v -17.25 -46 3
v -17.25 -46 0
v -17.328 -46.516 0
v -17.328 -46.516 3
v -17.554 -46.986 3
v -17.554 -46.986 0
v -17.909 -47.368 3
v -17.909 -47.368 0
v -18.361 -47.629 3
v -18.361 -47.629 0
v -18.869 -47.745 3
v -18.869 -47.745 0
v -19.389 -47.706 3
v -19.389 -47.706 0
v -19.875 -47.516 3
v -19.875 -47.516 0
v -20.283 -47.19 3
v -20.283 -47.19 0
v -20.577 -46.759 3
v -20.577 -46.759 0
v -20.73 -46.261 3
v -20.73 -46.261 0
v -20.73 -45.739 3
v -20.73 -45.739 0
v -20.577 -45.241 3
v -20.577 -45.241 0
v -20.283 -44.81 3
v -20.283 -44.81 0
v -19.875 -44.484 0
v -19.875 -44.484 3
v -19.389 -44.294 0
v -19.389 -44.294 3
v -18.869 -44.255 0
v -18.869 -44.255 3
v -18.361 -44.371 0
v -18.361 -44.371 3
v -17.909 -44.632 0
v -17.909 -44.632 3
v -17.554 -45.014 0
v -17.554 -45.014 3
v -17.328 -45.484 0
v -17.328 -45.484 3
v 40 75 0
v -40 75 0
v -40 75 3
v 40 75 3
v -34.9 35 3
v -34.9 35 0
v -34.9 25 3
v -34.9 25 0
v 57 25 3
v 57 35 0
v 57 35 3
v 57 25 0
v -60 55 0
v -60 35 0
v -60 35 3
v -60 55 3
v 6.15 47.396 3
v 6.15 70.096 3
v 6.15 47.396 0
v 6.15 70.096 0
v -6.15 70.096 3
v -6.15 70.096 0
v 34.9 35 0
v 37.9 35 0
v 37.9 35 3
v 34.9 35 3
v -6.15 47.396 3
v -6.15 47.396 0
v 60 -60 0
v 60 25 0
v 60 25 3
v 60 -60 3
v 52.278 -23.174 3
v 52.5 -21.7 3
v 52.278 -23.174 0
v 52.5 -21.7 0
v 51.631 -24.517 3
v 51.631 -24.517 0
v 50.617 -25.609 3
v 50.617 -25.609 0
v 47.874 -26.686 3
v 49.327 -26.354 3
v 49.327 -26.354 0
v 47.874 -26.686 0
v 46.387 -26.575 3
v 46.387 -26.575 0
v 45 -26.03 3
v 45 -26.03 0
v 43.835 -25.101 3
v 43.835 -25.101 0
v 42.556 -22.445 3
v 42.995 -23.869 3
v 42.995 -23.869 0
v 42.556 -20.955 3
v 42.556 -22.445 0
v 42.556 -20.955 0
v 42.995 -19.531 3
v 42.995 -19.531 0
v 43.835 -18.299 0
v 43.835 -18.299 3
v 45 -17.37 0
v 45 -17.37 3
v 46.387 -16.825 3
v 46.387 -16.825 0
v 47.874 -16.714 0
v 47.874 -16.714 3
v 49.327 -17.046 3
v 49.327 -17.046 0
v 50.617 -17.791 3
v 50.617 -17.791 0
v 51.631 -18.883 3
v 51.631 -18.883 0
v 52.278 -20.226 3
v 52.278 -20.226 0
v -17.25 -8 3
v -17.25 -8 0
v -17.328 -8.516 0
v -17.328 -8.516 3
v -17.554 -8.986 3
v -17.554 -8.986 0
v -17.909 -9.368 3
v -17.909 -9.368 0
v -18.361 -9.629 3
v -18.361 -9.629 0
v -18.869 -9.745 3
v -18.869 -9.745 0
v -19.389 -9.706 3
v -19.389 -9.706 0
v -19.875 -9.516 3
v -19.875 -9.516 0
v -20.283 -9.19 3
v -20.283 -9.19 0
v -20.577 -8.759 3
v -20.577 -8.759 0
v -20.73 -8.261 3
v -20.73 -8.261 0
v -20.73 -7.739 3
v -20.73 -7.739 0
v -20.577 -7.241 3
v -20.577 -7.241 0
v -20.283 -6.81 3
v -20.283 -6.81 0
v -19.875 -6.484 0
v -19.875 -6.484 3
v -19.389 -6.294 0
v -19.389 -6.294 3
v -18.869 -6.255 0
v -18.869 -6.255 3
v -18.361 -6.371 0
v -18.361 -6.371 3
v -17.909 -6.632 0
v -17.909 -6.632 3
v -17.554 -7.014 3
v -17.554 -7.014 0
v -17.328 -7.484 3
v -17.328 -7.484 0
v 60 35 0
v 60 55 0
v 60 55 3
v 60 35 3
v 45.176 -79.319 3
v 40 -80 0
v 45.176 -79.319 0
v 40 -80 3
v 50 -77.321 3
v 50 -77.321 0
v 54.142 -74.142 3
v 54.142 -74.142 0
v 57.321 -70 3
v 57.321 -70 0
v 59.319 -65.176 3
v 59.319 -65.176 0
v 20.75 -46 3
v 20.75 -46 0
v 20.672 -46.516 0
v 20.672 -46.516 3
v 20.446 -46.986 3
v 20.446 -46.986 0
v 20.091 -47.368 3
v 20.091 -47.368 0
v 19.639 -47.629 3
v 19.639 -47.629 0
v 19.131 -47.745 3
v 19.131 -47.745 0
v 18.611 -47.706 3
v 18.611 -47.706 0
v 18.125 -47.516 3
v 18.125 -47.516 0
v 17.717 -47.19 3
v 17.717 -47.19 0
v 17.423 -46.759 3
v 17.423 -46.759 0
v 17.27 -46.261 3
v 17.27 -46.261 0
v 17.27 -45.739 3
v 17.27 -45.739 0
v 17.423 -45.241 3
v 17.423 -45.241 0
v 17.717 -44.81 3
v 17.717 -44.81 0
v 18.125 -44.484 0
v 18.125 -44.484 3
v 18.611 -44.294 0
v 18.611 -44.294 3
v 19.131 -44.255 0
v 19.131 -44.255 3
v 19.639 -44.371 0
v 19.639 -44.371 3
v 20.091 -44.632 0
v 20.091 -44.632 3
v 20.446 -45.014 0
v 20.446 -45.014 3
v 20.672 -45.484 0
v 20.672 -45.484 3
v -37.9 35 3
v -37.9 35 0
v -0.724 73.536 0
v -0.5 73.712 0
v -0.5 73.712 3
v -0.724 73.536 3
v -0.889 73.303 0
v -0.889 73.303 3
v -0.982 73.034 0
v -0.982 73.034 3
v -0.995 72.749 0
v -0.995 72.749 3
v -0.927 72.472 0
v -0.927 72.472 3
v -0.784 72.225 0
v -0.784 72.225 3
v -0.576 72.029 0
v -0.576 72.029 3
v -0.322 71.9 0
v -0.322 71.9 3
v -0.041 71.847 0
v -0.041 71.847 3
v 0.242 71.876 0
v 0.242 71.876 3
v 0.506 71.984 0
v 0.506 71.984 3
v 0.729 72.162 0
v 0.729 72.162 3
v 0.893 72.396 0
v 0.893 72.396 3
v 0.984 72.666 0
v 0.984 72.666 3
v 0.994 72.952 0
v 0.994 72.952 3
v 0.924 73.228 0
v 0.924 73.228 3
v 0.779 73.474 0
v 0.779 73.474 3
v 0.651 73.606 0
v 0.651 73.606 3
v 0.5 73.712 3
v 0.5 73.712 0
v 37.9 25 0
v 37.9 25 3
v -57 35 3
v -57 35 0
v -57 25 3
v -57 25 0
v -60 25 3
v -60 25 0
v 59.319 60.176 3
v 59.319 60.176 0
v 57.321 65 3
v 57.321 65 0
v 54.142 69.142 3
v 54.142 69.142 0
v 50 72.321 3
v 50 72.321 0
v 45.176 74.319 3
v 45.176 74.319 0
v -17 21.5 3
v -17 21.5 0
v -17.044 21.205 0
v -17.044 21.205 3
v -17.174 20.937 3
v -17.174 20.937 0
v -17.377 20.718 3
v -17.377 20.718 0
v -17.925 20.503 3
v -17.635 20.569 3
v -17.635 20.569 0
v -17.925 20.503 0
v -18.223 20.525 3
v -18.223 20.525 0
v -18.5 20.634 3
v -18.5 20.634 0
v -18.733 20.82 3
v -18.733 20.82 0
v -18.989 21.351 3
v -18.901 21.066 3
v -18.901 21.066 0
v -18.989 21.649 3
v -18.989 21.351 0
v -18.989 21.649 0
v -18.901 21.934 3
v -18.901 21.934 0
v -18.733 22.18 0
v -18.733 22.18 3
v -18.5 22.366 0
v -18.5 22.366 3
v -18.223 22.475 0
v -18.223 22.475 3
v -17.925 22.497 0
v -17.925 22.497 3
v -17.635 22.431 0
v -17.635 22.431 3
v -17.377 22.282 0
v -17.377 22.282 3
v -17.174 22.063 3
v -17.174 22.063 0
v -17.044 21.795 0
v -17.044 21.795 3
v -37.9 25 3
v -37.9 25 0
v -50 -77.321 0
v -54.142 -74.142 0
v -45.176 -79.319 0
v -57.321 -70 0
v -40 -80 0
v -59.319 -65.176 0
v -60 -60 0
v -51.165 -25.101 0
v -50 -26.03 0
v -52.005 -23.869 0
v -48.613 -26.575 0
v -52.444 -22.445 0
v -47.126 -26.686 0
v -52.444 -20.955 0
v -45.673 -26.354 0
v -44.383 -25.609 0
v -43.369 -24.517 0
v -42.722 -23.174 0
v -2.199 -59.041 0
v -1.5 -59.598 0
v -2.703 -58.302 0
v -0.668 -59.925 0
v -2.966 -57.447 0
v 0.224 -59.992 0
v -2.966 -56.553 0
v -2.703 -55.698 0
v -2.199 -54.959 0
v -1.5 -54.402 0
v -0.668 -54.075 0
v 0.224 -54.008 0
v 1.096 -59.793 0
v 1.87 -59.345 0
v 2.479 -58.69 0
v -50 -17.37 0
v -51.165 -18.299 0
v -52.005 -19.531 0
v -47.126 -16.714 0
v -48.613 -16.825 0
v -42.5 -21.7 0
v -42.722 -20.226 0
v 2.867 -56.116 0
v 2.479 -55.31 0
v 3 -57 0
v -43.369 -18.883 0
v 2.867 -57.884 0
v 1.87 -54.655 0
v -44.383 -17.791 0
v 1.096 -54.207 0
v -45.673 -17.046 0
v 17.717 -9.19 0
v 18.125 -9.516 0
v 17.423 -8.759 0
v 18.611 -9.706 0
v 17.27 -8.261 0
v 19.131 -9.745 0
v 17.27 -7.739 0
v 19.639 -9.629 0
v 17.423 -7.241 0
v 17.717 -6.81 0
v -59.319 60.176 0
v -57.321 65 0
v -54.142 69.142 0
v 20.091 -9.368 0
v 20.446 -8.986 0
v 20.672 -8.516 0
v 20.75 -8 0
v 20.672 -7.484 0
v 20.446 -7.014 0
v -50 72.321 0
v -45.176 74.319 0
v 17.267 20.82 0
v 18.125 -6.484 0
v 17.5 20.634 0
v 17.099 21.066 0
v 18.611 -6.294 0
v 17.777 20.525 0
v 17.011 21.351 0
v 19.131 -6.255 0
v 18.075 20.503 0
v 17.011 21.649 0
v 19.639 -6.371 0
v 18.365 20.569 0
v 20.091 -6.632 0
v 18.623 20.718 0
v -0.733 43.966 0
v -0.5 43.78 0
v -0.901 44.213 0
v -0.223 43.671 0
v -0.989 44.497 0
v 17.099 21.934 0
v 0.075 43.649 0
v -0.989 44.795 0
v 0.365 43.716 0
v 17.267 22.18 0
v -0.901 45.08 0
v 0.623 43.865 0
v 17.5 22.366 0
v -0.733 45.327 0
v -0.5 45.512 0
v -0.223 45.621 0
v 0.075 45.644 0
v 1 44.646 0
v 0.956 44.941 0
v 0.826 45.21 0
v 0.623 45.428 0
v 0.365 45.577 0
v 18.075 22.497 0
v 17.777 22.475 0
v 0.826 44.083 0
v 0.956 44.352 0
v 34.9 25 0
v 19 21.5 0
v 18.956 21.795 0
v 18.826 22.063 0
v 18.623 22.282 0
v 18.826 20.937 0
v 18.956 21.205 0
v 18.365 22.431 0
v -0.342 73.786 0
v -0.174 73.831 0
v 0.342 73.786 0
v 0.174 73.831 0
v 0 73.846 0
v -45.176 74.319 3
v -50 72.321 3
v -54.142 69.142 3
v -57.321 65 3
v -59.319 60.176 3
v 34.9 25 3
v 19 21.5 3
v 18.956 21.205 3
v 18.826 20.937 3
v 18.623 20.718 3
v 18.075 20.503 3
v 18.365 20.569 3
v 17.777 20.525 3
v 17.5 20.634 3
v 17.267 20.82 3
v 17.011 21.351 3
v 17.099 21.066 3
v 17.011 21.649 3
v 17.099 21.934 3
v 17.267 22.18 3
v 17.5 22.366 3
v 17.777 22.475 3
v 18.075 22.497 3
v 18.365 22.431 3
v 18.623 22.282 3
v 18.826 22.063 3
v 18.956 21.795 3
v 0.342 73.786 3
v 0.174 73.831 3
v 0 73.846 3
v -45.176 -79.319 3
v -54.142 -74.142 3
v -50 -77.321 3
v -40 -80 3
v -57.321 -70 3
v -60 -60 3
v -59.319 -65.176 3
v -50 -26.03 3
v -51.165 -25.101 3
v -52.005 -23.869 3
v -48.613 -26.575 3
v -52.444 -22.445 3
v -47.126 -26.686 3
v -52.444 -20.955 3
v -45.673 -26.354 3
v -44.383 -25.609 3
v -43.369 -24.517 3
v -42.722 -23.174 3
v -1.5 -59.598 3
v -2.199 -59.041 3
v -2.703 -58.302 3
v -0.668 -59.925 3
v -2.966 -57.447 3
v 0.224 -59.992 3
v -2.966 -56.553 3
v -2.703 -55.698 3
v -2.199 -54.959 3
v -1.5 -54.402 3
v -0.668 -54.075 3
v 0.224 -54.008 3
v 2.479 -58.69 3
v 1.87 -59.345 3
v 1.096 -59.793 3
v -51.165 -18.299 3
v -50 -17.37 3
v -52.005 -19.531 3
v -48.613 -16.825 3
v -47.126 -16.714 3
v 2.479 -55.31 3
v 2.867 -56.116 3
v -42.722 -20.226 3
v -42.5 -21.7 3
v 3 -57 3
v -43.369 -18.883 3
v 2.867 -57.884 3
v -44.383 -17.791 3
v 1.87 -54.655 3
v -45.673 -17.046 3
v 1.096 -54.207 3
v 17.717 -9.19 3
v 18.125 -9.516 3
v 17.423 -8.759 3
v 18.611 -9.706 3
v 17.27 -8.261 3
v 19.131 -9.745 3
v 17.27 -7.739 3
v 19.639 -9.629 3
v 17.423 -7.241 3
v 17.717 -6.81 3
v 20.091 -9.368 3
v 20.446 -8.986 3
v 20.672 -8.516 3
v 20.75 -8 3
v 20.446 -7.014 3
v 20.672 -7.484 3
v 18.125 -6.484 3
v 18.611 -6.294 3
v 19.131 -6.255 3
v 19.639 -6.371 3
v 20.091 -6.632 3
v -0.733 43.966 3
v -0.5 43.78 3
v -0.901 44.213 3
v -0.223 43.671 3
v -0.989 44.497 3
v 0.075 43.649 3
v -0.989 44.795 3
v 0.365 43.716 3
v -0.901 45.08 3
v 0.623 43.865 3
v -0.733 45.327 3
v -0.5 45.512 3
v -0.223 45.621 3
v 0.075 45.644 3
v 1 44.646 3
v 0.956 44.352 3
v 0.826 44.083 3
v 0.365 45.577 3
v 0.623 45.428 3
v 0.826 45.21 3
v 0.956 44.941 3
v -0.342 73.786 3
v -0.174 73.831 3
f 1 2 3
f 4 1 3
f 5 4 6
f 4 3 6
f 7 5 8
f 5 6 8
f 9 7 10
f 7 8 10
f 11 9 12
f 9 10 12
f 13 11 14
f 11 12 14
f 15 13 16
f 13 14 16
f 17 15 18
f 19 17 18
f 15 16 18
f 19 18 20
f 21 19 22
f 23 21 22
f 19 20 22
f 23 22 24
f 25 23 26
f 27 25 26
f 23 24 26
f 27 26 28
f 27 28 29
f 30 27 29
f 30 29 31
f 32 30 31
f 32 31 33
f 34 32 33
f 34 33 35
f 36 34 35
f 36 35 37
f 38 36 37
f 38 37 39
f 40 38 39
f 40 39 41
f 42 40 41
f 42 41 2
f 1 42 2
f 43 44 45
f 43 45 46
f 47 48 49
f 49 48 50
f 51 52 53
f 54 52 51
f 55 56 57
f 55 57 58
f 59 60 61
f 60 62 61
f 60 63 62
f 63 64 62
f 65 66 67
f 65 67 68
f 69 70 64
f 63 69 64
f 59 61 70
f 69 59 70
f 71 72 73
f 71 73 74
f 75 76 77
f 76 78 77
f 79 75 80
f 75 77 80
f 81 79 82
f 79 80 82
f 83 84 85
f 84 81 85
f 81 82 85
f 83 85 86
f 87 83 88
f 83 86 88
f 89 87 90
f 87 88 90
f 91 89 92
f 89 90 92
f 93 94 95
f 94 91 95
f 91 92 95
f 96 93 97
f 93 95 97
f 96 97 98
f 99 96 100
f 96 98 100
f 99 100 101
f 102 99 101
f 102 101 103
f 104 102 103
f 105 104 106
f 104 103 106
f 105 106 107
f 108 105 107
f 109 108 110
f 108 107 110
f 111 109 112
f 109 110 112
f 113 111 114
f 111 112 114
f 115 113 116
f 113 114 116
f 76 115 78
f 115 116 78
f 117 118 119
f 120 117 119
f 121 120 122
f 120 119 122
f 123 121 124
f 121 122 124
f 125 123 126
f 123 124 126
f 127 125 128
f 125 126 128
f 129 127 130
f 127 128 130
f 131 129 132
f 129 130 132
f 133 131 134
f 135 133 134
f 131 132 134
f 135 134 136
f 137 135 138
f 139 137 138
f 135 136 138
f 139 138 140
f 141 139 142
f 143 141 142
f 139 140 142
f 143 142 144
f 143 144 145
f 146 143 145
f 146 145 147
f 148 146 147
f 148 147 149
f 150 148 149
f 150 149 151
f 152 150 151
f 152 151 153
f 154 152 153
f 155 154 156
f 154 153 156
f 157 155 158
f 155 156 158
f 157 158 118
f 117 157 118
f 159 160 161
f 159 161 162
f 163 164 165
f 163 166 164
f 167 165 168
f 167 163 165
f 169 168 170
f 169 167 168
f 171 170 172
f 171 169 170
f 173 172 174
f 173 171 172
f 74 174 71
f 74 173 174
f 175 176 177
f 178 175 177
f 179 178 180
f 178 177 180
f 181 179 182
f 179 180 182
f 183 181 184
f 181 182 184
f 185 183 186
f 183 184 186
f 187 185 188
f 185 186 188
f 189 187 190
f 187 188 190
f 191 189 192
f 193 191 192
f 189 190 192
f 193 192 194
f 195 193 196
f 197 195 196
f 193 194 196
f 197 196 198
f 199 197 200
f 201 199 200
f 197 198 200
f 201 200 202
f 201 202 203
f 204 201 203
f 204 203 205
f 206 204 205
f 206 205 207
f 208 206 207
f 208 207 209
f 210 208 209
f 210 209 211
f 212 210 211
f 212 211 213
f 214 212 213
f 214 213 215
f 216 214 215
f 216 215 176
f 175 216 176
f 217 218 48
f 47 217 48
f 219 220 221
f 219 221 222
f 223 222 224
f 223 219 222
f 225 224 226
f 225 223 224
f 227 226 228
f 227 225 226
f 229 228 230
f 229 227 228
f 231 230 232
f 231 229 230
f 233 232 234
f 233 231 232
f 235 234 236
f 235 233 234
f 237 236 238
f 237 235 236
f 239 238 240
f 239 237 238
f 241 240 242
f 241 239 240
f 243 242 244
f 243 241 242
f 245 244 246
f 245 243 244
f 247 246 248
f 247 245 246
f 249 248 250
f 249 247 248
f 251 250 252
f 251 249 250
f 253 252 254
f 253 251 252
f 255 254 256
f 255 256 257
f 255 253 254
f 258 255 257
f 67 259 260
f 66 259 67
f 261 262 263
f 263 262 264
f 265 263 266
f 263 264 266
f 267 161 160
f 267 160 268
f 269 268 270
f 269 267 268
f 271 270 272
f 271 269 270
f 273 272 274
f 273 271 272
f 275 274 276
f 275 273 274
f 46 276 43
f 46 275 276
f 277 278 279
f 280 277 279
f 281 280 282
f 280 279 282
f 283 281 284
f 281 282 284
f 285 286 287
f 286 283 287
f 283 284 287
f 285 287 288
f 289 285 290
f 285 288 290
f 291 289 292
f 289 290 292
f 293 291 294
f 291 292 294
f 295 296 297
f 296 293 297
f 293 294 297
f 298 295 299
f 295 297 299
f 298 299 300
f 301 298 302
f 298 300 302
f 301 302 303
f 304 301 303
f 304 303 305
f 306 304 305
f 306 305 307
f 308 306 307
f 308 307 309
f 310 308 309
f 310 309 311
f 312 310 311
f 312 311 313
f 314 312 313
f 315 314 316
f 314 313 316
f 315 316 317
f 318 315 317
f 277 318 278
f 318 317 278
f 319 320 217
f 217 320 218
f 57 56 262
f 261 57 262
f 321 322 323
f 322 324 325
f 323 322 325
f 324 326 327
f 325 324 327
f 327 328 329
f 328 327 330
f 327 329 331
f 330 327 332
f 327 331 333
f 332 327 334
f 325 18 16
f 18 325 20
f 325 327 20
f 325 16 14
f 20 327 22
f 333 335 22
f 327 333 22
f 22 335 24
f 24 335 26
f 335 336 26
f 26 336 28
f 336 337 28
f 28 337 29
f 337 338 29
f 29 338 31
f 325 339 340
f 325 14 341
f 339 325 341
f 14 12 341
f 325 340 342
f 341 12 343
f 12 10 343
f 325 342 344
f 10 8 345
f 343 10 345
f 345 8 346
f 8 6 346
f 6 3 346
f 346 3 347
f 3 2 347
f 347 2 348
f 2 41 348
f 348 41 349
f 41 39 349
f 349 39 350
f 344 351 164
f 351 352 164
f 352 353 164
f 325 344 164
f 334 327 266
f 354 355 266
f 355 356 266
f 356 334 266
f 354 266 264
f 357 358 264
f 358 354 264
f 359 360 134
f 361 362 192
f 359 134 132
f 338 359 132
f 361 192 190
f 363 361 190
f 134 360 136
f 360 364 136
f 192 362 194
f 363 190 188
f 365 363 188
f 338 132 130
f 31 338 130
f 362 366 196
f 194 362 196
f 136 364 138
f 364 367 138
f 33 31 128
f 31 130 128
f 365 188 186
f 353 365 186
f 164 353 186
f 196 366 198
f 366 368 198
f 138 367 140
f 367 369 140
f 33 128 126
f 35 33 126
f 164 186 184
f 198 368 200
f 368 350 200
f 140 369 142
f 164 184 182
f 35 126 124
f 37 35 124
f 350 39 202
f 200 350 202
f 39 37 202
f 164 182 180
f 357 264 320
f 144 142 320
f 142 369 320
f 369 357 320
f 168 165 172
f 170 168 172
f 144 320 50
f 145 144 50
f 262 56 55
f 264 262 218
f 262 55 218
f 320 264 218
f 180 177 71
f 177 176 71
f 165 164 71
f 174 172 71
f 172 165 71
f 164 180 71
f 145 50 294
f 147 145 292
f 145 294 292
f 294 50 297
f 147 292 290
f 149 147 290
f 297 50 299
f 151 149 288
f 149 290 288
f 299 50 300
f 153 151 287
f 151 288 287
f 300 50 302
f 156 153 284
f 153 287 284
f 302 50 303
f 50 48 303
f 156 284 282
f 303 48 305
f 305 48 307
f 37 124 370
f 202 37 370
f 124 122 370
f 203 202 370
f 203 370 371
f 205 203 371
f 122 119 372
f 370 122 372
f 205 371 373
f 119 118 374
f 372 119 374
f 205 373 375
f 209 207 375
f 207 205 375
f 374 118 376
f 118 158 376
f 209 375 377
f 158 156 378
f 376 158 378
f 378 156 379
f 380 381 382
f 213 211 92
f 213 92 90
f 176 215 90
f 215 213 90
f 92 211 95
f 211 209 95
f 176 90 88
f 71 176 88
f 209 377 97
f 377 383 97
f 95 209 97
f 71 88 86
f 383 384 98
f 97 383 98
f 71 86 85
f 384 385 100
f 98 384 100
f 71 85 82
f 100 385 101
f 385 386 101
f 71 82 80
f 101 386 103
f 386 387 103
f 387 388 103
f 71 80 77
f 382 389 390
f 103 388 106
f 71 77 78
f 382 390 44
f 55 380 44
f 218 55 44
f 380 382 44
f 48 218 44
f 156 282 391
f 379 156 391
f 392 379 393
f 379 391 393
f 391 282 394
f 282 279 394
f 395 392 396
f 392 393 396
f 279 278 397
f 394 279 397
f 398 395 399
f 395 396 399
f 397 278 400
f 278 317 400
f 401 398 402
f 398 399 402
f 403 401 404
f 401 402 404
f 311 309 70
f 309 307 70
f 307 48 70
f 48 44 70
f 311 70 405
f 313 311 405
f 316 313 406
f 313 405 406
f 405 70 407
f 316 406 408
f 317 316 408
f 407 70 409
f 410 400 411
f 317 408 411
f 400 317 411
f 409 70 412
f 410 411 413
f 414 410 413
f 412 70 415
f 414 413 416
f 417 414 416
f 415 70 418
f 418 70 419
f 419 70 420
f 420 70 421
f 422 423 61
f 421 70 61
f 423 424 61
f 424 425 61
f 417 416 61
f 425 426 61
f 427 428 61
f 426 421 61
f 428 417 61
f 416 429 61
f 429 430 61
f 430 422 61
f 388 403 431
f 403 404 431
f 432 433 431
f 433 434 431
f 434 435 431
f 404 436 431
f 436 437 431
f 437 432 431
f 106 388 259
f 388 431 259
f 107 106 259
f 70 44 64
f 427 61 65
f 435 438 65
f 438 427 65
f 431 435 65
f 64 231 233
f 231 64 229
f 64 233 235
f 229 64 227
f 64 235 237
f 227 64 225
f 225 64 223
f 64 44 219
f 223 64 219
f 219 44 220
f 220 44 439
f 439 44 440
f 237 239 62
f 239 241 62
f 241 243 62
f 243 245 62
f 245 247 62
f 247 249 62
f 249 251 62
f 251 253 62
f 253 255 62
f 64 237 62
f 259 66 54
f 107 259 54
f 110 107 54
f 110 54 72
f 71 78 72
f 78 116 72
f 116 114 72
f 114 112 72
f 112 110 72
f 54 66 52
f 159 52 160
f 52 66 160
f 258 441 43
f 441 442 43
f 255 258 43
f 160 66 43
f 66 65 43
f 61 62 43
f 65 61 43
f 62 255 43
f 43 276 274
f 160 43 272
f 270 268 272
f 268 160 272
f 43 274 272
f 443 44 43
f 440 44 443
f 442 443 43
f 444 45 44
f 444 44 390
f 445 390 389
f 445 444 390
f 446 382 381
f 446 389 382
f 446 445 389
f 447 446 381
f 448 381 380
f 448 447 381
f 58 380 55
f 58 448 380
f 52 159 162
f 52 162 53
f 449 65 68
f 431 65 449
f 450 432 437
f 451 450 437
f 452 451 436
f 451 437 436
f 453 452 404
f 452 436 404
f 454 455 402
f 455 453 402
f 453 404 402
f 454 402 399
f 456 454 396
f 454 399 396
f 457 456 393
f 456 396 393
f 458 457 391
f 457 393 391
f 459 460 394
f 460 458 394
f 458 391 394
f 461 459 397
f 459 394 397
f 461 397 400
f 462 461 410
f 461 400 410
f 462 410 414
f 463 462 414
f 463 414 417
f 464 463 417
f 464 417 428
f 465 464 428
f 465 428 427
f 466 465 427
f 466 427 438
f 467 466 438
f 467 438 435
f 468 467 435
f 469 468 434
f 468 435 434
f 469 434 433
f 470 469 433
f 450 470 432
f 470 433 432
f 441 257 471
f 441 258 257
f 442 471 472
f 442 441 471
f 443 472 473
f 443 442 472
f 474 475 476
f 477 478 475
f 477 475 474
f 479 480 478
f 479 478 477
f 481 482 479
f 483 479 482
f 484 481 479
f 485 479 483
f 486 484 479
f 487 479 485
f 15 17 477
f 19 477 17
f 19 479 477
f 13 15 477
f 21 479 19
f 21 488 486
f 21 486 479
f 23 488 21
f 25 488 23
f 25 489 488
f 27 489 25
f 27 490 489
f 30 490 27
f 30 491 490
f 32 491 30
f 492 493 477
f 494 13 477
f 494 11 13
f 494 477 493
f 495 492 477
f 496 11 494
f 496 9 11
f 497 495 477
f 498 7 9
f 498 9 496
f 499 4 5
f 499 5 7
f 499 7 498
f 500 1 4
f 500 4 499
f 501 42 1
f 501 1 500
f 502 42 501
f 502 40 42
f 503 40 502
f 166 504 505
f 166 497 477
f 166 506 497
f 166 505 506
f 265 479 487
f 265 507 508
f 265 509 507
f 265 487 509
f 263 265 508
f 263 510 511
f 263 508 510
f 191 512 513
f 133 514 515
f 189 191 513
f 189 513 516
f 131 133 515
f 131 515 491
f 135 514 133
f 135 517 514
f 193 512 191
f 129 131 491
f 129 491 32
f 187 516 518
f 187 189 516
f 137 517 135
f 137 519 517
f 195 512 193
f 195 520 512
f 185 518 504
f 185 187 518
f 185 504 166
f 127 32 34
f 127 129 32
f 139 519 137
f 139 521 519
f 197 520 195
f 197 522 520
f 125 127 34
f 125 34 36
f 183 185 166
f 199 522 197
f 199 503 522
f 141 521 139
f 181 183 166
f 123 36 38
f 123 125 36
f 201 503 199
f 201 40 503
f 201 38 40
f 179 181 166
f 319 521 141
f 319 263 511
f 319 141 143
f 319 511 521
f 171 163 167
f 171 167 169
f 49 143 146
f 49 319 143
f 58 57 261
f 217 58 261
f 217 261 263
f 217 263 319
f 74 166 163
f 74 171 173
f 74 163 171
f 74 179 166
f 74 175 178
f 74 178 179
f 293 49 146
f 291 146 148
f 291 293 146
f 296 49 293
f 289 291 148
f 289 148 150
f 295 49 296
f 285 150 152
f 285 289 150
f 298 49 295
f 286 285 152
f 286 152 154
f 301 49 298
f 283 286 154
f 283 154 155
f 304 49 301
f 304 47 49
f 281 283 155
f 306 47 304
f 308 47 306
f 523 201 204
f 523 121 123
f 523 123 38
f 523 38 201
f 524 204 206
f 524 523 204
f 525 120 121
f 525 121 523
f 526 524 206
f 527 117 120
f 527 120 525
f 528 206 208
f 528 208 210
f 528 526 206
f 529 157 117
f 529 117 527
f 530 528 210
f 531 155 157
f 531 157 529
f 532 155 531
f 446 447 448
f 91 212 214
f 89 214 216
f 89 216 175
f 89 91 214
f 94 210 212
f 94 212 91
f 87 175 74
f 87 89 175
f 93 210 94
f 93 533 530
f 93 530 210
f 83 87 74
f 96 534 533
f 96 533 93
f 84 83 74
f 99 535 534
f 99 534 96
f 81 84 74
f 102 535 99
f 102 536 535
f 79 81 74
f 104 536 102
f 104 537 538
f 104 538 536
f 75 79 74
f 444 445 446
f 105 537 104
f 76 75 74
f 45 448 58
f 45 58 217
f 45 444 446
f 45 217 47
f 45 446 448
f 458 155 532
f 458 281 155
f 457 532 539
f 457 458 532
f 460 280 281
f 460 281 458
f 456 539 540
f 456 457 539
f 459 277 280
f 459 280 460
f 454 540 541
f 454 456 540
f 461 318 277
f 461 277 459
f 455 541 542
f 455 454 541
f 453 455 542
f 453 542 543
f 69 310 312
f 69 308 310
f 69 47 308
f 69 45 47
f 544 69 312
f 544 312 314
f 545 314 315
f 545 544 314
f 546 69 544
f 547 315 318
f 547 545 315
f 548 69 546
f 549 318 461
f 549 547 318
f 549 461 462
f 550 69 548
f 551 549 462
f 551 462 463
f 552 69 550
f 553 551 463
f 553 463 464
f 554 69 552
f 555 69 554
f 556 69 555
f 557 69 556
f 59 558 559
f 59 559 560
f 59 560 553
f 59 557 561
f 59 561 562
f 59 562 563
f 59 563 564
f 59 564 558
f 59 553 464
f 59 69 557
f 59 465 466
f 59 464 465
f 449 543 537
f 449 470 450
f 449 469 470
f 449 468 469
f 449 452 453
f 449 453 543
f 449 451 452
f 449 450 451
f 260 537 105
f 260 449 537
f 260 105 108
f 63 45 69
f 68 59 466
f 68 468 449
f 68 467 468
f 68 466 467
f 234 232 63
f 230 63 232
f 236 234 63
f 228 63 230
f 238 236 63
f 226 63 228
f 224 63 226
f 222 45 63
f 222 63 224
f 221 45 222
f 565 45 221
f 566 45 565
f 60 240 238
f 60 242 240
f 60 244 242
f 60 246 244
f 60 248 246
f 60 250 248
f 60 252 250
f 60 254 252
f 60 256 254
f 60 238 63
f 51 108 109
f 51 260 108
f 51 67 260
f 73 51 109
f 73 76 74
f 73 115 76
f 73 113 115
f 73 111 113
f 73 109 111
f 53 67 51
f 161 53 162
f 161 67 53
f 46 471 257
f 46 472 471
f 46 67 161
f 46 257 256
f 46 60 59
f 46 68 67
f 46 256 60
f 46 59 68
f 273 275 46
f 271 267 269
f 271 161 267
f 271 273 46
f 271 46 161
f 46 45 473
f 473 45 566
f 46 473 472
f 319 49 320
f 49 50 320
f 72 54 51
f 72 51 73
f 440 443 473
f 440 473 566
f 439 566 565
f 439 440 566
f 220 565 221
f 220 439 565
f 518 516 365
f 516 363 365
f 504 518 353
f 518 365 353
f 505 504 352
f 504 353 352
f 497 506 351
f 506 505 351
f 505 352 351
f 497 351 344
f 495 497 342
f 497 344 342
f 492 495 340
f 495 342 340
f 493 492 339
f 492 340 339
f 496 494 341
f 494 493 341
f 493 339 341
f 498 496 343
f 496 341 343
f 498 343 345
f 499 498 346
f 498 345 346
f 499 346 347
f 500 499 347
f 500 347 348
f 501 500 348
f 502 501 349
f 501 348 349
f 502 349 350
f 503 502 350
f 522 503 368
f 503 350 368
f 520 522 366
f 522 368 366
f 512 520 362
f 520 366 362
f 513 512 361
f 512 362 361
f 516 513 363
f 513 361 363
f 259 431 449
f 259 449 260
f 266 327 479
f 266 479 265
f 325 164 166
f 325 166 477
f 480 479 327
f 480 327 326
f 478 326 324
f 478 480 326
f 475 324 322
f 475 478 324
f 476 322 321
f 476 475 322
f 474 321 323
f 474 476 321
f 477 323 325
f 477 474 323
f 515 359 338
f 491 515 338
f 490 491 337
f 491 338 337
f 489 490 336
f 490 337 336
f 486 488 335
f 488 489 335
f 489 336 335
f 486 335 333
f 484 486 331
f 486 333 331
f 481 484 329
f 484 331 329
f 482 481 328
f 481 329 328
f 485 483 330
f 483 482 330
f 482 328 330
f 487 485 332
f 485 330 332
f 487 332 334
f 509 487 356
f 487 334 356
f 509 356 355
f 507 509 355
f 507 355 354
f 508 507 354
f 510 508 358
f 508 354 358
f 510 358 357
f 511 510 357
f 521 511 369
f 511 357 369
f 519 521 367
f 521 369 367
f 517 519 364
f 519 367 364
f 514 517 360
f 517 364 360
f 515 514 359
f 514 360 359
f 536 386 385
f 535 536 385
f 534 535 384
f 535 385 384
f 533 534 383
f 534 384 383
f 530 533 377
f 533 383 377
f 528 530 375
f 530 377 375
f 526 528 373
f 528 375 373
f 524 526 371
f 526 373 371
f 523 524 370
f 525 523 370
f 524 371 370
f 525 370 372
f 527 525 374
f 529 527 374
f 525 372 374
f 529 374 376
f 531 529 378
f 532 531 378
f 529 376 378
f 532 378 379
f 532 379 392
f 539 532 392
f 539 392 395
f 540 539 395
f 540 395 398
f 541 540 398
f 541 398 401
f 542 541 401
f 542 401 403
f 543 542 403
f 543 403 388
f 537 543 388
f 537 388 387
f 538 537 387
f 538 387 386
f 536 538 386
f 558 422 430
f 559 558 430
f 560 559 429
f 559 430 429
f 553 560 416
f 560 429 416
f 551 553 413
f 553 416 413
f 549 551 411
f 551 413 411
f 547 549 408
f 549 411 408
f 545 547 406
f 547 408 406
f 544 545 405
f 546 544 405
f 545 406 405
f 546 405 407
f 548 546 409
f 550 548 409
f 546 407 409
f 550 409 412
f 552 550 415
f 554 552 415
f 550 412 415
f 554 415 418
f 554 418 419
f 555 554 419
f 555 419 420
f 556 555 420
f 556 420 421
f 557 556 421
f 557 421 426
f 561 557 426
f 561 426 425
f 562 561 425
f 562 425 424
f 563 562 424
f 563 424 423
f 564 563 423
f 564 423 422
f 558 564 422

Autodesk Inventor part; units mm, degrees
ref_plane "YZ Plane" through (0, 0, 0) normal (1, 0, 0) x (0, 1, 0)
ref_plane "XZ Plane" through (0, 0, 0) normal (0, 1, 0) x (-1, 0, 0)
ref_plane "XY Plane" through (0, 0, 0) normal (0, 0, 1) x (1, 0, 0)
sketch "Sketch1" plane through (0, 0, 0) normal (0, 0, 1) x (1, 0, 0)
  line L0 (-60, -75) -> (-60, 75)
  line L1 (-60, 75) -> (60, 75)
  line L2 (60, 75) -> (60, -75)
  ellipse E0 centre (0, 72.8464) end of major axis (0, 73.8464) minor radius 1
  line L3 (-6.15, 70.0964) -> (6.15, 70.0964)
  line L4 (6.15, 70.0964) -> (6.15, 47.3964)
  line L5 (6.15, 47.3964) -> (-6.15, 47.3964)
  line L6 (-6.15, 47.3964) -> (-6.15, 70.0964)
  circle A0 centre (0, 44.6464) radius 1
  line L7 (60, 35) -> (57, 35)
  line L8 (57, 35) -> (57, 25)
  line L9 (57, 25) -> (60, 25)
  line L10 (60, 25) -> (60, 35)
  line L11 (37.9, 35) -> (34.9, 35)
  line L12 (34.9, 35) -> (34.9, 25)
  line L13 (34.9, 25) -> (37.9, 25)
  line L14 (37.9, 25) -> (37.9, 35)
  line L15 (-60, 35) -> (-57, 35)
  line L16 (-57, 35) -> (-57, 25)
  line L17 (-57, 25) -> (-60, 25)
  line L18 (-60, 25) -> (-60, 35)
  line L19 (-37.9, 35) -> (-34.9, 35)
  line L20 (-34.9, 35) -> (-34.9, 25)
  line L21 (-34.9, 25) -> (-37.9, 25)
  line L22 (-37.9, 25) -> (-37.9, 35)
  line L23 (-0.5, 73.7124) -> (-0.5, 74.9964)
  line L24 (-0.5, 74.9964) -> (-6.15, 74.9964)
  line L25 (-6.15, 70.0964) -> (-6.15, 74.9964)
  line L26 (6.15, 70.0964) -> (-6.15, 70.0964)
  line L27 (6.15, 70.0964) -> (6.15, 74.9964)
  line L28 (6.15, 74.9964) -> (0.5, 74.9964)
  line L29 (0.5, 74.9964) -> (0.5, 73.7124)
  ellipse E1 centre (0, 72.8464) end of major axis (0, 71.8464) minor radius 1 (-0.5, 73.7124) -> (0.5, 73.7124) ccw
  line L30 (-0.5, 42.4964) -> (-0.5, 43.7803)
  ellipse E2 centre (0, 44.6464) end of major axis (0, 43.6464) minor radius 1 (0.5, 43.7803) -> (-0.5, 43.7803) ccw
  line L31 (0.5, 43.7803) -> (0.5, 42.4964)
  line L32 (6.15, 42.4964) -> (0.5, 42.4964)
  line L33 (6.15, 47.3964) -> (6.15, 42.4964)
  line L34 (-6.15, 47.3964) -> (6.15, 47.3964)
  line L35 (-6.15, 47.3964) -> (-6.15, 42.4964)
  line L36 (-0.5, 42.4964) -> (-6.15, 42.4964)
  line L37 (-6.15, 63.9464) -> (-6.15, 47.3964)
  line L38 (-6.15, 47.3964) -> (6.15, 47.3964)
  line L39 (6.15, 47.3964) -> (6.15, 63.9464)
  line L40 (6.15, 63.9464) -> (6.15, 70.0964)
  line L41 (6.15, 70.0964) -> (0, 70.0964)
  line L42 (0, 70.0964) -> (-6.15, 70.0964)
  line L43 (-6.15, 70.0964) -> (-6.15, 63.9464)
  line L44 (24.5, 3) -> (-24.5, 3)
  line L45 (-24.5, 3) -> (-24.5, 40)
  line L46 (-24.5, 40) -> (24.5, 40)
  line L47 (24.5, 40) -> (24.5, 3)
  circle A1 centre (-18, 21.5) radius 1
  circle A2 centre (18, 21.5) radius 1
  line L48 (19, -46) -> (-19, -46)
  line L49 (-19, -46) -> (-19, -8)
  line L50 (-19, -8) -> (19, -8)
  line L51 (19, -8) -> (19, -46)
  line L52 (19, -46) -> (-19, -8) construction
  line L53 (-19, -46) -> (19, -8) construction
  line L54 (22, -49) -> (-22, -49)
  line L55 (-22, -49) -> (-22, -5)
  line L56 (-22, -5) -> (22, -5)
  line L57 (22, -5) -> (22, -49)
  line L58 (22, -49) -> (-22, -5) construction
  line L59 (-22, -49) -> (22, -5) construction
  line L60 (-22, -5) -> (22, -5)
  line L61 (22, -5) -> (22, -2)
  line L62 (22, -2) -> (-22, -2)
  line L63 (-22, -2) -> (-22, -5)
  circle A3 centre (-19, -8) radius 1.75
  circle A4 centre (19, -8) radius 1.75
  circle A5 centre (-19, -46) radius 1.75
  circle A6 centre (19, -46) radius 1.75
  line L64 (-57, 65) -> (-38, 65)
  line L65 (-38, 65) -> (-38, 0.5)
  line L66 (-38, 0.5) -> (-57, 0.5)
  line L67 (-57, 0.5) -> (-57, 65)
  circle A7 centre (-47.5, -21.7) radius 5
  circle A8 centre (47.5, -21.7) radius 5
  circle A9 centre (0, -57) radius 3
  line L68 (60, -61) -> (60, -80)
  line L69 (60, -80) -> (-60, -80)
  line L70 (-60, -80) -> (-60, -62.9398)
  point P0 (0, 0)
  point P1 (-6.15, 70.0964)
  point P2 (0, -27)
  point P3 (0, -27)
  dimension "d114" = 1
  dimension "d115" = 1
  dimension "d116" = 1
  dimension "d117" = 1
  dimension "d118" = 1
  dimension "d0" = 120
  dimension "d1" = 150
  dimension "d2" = 3
  dimension "d3" = 10
  dimension "d4" = 40
  dimension "d5" = 3
  dimension "d6" = 19.1
  dimension "d7" = 3
  dimension "d8" = 10
  dimension "d9" = 3
  dimension "d10" = 19.1
  dimension "d94" = 49
  dimension "d95" = 37
  dimension "d96" = 32.5036
  dimension "d98" = 35
  dimension "d99" = 2
  dimension "d100" = 2
  dimension "d101" = 36
  dimension "d102" = 6.5
  dimension "d103" = 6.5
  dimension "d104" = 18.5
  dimension "d105" = 18.5
  dimension "d113" = 72
  dimension "d119" = 90
  dimension "d120" = 90
  dimension "d121" = 90
  dimension "d122" = 90
  dimension "d123" = 90
  dimension "d124" = 90
  dimension "d125" = 90
  dimension "d126" = 90
  dimension "d127" = 90
  dimension "d128" = 90
  dimension "d129" = 35.5
  dimension "d130" = 53.85
  dimension "d131" = 53.85
  dimension "d132" = 59.5
  dimension "d133" = 59.5
  dimension "d134" = 60.5
  dimension "d135" = 66.15
  dimension "d136" = 66.15
  dimension "d137" = 94.9
  dimension "d138" = 0
  dimension "d139" = 10
  dimension "d140" = 39.9964
  dimension "d141" = 35.0964
  dimension "d142" = 12.3964
  dimension "d143" = 35.0964
  dimension "d145" = 39.9964
  dimension "d146" = 7.4964
  dimension "d147" = 12.3964
  dimension "d148" = 0
  dimension "d149" = 60
  dimension "d150" = 35
  dimension "d151" = 70.0964
  dimension "d152" = 6.15
  dimension "d153" = 6.15
  dimension "d154" = 6.15
  dimension "d155" = 0.5
  dimension "d156" = 70.0964
  dimension "d157" = 6.15
  dimension "d158" = 47.3964
  dimension "d159" = 6.15
  dimension "d160" = 6.15
extrude "Extrusion1" add sketch "Sketch1" along normal blind 3 contours L0 L17 L67 L66 L65 L64 L15 L1 L2 L7 L8 L9 L68 L69 L70 | L16 L67 L64 L65 L66 | E0 L29 L28 L27 L3 L25 L24 L23 | L5 L33 L32 L31 A0 L30 L36 L35 | L44 L45 L46 L47 | A5 L49 A3 L50 A4 L51 A6 L48 | L54 L55 L56 L57 | L56 L63 L62 L61
fillet "Fillet1" radius 20 4 edges at (-60, 75, 1.5) (60, 75, 1.5) (-60, -80, 1.5) (60, -80, 1.5)
properties part number "Base SD Serayu"
